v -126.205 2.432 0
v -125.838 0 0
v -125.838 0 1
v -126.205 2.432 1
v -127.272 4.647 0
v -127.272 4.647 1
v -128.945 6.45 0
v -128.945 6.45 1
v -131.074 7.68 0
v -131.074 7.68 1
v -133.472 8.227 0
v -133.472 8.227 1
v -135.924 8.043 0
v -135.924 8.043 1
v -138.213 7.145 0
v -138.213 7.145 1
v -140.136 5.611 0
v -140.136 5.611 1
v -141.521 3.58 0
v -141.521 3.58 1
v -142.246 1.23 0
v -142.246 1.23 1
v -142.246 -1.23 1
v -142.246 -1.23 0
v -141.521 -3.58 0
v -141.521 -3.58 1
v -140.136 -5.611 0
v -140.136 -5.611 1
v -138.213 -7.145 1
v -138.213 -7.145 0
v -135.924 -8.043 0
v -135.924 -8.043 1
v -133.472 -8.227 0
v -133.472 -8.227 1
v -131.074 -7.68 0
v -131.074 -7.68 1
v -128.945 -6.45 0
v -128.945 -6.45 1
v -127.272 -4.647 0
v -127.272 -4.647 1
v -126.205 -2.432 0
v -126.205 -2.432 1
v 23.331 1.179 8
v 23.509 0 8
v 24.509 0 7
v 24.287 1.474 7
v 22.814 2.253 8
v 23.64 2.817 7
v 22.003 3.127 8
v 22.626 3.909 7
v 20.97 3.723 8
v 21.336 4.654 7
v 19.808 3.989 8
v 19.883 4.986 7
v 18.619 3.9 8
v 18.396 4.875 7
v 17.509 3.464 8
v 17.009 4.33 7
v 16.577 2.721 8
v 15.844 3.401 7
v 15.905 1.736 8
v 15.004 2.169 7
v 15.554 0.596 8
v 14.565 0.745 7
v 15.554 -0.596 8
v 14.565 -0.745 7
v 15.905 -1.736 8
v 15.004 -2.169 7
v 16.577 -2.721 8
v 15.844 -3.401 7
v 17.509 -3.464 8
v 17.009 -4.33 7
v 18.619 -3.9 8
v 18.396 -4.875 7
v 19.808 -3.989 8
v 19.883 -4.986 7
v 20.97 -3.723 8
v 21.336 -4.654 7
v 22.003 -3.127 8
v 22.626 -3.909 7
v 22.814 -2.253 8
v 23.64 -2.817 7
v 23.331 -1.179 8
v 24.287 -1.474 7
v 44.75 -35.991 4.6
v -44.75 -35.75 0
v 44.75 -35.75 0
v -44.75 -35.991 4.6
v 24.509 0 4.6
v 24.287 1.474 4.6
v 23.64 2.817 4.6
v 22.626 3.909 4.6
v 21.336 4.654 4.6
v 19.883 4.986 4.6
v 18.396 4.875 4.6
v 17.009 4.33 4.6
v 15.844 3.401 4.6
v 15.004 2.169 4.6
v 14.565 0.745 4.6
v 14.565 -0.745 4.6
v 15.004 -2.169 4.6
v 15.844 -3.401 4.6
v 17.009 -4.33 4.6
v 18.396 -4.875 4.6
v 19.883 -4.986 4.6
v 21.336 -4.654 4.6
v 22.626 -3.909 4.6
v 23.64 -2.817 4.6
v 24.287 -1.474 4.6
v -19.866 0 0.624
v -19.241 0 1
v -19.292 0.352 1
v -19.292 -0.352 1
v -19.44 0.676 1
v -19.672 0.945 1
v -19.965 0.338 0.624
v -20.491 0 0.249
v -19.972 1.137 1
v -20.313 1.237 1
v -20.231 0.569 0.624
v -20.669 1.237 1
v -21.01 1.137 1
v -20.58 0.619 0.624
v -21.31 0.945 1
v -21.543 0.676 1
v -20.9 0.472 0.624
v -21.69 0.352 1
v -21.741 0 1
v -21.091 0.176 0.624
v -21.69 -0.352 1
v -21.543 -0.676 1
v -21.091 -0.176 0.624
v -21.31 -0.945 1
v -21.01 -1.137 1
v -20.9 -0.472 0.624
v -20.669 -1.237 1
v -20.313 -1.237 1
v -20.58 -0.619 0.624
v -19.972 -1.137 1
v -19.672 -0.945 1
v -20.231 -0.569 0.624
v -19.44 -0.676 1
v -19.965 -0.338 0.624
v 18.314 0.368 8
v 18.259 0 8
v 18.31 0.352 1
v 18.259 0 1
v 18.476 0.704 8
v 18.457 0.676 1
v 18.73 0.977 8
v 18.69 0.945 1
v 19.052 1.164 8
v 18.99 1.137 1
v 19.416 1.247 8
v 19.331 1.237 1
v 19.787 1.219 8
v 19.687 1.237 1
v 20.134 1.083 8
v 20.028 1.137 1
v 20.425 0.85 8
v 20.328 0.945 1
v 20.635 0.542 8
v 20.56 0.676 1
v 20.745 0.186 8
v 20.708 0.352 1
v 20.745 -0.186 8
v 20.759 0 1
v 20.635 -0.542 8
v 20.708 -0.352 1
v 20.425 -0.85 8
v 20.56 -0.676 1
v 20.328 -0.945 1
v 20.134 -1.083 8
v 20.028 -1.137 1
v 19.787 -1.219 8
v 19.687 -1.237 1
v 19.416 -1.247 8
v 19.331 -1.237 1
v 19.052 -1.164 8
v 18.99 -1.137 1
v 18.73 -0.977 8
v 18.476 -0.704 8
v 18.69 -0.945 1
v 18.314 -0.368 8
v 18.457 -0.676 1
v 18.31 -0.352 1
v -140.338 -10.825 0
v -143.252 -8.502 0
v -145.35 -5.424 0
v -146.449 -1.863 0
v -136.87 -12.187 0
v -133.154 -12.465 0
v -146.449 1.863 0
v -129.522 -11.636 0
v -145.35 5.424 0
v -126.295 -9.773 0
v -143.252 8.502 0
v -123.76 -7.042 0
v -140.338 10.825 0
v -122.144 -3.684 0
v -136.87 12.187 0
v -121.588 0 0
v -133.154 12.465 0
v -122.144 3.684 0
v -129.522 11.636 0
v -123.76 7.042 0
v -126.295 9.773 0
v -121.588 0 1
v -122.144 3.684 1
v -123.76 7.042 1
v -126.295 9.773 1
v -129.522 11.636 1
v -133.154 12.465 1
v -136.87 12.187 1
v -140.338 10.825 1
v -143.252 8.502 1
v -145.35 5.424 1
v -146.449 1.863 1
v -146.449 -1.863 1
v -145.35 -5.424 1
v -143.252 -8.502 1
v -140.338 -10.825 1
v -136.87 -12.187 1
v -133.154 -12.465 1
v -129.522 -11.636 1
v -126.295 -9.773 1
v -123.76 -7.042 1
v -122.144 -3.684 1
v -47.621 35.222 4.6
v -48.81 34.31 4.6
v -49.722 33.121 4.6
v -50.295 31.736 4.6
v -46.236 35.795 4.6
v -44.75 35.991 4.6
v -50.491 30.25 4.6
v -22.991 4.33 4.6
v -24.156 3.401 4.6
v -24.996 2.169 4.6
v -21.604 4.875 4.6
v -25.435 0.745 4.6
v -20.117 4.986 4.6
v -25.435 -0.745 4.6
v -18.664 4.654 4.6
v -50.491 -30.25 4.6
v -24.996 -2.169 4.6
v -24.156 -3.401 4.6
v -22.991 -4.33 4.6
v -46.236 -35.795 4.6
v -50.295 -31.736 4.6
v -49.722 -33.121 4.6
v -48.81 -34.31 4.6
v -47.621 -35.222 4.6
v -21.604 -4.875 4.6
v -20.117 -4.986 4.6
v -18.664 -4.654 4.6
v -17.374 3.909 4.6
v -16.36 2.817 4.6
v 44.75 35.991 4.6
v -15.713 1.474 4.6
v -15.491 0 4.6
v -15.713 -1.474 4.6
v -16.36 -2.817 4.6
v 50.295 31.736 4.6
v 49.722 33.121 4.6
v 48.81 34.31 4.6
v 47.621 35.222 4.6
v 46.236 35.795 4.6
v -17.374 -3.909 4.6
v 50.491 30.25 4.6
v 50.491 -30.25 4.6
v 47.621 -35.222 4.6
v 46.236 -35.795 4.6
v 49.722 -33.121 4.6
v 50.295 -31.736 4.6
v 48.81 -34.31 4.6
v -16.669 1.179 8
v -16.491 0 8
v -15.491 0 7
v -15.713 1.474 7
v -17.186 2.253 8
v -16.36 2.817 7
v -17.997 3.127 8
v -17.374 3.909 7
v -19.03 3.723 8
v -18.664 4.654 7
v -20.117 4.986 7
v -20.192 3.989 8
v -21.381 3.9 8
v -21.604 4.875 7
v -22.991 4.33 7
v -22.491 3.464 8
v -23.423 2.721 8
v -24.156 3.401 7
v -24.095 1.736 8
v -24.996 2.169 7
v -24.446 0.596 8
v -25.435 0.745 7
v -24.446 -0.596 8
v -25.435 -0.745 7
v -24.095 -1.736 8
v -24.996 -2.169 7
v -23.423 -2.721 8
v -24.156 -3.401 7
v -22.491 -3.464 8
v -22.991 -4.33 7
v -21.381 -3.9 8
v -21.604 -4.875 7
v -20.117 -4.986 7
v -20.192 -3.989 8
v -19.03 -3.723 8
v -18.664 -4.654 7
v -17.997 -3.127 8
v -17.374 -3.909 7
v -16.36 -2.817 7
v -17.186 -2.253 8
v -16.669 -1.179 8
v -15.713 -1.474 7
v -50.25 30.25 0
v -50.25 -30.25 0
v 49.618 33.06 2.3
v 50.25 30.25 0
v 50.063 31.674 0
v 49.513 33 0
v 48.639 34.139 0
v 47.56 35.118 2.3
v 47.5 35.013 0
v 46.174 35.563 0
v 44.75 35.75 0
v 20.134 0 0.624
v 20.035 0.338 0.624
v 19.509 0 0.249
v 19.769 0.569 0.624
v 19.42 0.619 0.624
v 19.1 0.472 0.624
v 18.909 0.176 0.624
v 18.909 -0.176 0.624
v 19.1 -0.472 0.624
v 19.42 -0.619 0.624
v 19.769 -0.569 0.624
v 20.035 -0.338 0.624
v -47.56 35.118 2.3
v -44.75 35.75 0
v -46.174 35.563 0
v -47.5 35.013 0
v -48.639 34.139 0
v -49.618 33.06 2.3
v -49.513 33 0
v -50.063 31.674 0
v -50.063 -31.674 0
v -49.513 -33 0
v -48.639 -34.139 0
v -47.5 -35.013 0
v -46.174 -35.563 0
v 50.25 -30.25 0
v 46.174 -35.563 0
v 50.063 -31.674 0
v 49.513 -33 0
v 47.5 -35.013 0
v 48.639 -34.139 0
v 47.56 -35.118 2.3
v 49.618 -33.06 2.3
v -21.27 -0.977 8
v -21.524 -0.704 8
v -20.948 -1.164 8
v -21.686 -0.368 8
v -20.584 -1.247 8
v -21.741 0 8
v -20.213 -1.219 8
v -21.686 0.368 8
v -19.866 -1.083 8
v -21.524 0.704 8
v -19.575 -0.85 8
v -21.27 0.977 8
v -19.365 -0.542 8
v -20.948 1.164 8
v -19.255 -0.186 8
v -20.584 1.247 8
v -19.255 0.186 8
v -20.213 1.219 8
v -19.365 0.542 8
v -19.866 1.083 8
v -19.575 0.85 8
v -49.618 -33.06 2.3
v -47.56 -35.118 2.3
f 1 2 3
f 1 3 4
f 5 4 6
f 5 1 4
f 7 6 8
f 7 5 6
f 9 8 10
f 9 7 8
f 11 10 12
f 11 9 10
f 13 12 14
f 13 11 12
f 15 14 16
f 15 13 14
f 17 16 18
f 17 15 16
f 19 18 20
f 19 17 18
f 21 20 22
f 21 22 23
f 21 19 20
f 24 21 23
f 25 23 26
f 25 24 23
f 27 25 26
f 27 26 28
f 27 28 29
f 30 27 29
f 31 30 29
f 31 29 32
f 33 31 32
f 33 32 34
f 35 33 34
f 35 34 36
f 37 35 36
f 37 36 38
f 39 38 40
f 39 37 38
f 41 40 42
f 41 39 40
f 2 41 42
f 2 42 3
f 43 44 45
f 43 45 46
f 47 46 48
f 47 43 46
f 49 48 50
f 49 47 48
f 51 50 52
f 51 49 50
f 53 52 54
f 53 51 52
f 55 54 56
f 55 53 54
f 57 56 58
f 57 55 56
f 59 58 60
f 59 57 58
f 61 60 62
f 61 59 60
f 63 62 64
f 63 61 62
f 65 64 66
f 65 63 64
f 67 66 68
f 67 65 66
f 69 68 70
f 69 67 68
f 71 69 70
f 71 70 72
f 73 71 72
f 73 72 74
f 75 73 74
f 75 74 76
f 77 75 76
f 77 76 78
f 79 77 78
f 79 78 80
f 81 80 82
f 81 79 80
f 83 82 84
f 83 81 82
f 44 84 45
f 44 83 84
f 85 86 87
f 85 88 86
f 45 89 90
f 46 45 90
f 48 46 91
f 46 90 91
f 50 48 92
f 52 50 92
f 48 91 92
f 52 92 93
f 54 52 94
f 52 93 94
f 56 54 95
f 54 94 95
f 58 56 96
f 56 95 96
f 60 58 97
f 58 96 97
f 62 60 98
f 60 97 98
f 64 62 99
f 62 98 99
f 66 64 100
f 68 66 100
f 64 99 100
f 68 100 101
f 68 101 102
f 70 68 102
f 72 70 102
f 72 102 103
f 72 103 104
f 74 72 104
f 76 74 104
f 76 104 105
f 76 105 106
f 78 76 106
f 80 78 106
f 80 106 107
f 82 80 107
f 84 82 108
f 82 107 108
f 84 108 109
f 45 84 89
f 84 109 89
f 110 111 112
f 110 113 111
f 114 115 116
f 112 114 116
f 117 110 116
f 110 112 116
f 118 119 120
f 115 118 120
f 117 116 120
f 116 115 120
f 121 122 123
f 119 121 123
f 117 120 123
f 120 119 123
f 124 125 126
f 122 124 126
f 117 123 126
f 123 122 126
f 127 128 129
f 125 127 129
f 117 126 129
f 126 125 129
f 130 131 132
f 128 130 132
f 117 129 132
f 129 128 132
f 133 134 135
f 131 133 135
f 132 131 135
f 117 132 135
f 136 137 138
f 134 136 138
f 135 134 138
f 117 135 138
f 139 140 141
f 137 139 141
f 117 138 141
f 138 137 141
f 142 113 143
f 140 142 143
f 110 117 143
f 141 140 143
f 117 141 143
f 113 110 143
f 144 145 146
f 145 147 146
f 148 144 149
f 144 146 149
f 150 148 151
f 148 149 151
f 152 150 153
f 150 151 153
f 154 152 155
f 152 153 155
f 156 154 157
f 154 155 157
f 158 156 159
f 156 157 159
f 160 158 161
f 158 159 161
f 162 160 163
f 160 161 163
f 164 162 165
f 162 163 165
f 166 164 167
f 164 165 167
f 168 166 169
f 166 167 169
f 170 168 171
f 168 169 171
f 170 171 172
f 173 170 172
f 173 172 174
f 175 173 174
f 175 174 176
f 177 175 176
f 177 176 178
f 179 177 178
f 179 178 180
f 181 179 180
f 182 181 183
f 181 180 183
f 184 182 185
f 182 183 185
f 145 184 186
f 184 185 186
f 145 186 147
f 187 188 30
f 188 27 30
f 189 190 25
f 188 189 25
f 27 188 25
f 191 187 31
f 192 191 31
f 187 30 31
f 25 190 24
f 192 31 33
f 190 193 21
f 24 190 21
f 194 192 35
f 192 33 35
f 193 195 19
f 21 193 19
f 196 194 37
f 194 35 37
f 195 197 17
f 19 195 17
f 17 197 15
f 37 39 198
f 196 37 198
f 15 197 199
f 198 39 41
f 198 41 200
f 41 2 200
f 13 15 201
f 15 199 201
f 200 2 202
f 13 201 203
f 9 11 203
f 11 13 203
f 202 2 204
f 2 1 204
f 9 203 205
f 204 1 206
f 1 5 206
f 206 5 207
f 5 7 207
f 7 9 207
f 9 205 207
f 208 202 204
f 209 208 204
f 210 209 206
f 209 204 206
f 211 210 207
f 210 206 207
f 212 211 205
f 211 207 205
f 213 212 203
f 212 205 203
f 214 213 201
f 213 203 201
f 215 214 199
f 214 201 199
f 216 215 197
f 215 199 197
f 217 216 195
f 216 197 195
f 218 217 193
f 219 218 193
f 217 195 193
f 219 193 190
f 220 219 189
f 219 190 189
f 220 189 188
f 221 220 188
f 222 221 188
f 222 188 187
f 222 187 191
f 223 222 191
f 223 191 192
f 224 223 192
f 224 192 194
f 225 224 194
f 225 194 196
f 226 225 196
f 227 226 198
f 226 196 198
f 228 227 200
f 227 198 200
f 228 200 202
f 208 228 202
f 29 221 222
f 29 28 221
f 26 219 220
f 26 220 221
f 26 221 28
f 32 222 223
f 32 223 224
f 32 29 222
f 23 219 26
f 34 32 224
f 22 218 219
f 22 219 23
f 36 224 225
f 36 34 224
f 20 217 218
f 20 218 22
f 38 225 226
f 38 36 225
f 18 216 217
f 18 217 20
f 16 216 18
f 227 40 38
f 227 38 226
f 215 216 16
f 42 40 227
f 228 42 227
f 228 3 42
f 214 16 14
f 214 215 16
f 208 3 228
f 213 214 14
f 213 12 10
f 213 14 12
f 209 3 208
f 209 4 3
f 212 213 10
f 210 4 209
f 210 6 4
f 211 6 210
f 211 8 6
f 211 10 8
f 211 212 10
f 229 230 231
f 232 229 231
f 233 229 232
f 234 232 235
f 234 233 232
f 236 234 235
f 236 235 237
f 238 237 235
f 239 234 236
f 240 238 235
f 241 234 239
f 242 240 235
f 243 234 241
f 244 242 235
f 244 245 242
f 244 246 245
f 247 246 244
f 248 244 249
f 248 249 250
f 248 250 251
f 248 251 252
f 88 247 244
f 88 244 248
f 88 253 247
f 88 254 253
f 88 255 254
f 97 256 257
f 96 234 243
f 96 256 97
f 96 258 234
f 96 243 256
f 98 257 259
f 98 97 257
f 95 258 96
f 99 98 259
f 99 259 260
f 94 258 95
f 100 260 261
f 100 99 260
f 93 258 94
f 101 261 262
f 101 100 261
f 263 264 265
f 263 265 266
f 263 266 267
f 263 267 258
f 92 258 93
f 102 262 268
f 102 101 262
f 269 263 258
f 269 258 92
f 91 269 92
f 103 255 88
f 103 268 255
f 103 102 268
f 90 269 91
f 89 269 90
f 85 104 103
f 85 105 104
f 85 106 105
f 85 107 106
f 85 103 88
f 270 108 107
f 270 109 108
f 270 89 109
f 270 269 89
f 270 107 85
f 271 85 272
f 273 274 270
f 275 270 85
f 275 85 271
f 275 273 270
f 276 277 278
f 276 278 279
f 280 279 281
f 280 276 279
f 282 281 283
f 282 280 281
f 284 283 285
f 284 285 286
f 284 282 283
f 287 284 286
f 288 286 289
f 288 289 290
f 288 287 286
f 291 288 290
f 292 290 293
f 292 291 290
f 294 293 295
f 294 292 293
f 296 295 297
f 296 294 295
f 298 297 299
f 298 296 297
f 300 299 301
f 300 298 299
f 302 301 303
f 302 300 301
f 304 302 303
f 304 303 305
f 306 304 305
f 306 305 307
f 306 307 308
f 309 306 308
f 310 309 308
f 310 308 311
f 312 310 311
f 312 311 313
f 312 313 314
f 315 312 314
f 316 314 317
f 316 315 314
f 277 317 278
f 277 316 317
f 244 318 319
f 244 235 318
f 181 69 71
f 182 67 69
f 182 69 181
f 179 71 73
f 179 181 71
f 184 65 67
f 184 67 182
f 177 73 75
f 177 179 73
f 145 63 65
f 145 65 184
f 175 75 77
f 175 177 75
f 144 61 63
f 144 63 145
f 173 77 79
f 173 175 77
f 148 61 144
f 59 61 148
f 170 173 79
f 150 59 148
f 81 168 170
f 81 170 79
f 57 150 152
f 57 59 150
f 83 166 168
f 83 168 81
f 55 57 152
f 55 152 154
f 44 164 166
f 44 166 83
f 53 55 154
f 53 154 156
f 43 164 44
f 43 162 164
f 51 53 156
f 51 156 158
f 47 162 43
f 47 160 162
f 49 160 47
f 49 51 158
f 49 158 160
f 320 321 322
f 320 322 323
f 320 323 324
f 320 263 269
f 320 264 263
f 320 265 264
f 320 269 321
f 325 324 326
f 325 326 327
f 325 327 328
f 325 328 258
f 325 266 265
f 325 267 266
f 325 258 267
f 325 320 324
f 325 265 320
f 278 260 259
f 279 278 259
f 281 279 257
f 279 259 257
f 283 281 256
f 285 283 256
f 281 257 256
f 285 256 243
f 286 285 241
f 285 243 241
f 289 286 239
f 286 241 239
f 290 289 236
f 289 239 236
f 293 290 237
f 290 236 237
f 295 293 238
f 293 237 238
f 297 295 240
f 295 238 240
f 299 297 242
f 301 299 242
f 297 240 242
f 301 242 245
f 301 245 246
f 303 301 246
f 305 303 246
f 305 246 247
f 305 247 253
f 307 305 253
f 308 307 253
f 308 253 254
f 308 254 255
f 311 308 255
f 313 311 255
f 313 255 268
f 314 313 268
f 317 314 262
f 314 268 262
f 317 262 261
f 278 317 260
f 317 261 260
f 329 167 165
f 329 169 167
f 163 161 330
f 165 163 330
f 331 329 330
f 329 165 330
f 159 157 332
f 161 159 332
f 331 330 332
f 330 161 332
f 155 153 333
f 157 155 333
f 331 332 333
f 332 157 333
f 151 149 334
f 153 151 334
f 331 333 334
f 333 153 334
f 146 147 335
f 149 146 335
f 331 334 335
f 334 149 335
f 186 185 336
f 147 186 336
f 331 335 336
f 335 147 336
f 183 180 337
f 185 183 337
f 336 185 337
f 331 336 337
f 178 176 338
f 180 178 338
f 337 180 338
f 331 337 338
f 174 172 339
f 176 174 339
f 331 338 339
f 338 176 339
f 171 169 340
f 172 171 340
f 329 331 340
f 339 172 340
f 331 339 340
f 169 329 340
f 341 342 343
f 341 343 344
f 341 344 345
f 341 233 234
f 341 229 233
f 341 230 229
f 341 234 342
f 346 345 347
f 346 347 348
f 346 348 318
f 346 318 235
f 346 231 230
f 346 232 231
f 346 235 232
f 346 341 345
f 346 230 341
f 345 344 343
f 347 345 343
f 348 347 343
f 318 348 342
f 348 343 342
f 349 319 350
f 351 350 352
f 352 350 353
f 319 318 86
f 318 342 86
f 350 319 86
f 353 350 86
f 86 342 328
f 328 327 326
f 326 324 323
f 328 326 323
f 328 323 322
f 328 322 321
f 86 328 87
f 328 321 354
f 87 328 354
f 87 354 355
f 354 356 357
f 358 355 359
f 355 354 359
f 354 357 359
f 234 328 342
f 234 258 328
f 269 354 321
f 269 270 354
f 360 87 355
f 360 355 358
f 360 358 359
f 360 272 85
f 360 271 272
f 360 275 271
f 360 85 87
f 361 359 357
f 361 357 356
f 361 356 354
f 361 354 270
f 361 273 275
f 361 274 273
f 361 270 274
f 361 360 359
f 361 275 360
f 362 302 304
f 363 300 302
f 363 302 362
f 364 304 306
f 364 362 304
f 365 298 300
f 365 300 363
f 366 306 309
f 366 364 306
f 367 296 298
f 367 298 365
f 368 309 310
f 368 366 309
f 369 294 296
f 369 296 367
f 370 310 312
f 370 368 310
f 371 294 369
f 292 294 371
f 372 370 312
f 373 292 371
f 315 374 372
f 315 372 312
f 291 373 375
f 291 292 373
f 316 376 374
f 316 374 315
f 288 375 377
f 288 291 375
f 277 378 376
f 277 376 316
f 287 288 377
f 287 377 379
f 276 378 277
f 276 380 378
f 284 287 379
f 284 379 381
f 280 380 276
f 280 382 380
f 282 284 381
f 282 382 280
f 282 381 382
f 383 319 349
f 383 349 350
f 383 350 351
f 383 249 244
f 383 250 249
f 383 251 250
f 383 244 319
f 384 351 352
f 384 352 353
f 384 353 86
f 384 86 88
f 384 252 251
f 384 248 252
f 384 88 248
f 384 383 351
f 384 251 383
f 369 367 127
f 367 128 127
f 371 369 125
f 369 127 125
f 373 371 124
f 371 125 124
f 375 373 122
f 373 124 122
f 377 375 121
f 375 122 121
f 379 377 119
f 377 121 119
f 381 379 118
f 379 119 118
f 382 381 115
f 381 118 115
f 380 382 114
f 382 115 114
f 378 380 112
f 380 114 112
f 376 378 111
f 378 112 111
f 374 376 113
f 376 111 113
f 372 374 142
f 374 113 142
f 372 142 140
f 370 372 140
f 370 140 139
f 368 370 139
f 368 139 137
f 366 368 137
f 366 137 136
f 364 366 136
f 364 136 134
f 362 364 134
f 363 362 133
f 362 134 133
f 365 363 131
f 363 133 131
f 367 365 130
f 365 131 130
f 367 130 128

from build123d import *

# Parameters (mm, degrees)
F1_DEPTH = 4.6
F1_TAPER = -3
F2_R     = 5
F3_DEPTH = 3.4
F4_SIZE  = 1
F6_D     = 2.5
F6_DEPTH = 7
F6_TIP   = 0.7510757738
F7_R     = 12.5
F7_R_2   = 8.25
F8_DEPTH = 1


with BuildPart() as f1:
    # F0 (on Top) → F1 (new body)
    with BuildSketch(Plane.XY):
        with BuildLine():
            Line((-44.75, -35.75), (44.75, -35.75))
            ThreePointArc((44.75, -35.75), (48.6390872965, -34.1390872965), (50.25, -30.25))
            Line((50.25, -30.25), (50.25, 30.25))
            ThreePointArc((50.25, 30.25), (48.6390872965, 34.1390872965), (44.75, 35.75))
            Line((44.75, 35.75), (-44.75, 35.75))
            ThreePointArc((-44.75, 35.75), (-48.6390872965, 34.1390872965), (-50.25, 30.25))
            Line((-50.25, 30.25), (-50.25, -30.25))
            ThreePointArc((-50.25, -30.25), (-48.6390872965, -34.1390872965), (-44.75, -35.75))
        make_face()
    extrude(amount=F1_DEPTH, taper=F1_TAPER)

    # F2 (on face) → F3 (join)
    with BuildSketch(Plane.XY.offset(4.6)):
        with Locations((19.5089242153, 0)):
            Circle(F2_R)
        with Locations((-20.4910757847, 0)):
            Circle(F2_R)
    extrude(amount=F3_DEPTH)

    # F4
    f4_edges = [f1.edges().sort_by_distance(p)[0] for p in [
        (-25.491076, 0, 8),
        (14.508924, 0, 8),
    ]]
    chamfer(f4_edges, length=F4_SIZE)

    # F6
    with Locations(Plane.XY.offset(8)):
        with Locations((-20.4910757847, 0), (19.5089242153, 0)):
            Hole(F6_D / 2, depth=F6_DEPTH)
            with Locations((0, 0, -(F6_DEPTH + F6_TIP / 2))):  # 118° drill point
                Cone(0, F6_D / 2, F6_TIP, mode=Mode.SUBTRACT)


with BuildPart() as f8:
    # F7 (on Top) → F8 (new body)
    with BuildSketch(Plane.XY):
        with Locations((-134.0883696164, 0)):
            Circle(F7_R)
        with Locations((-134.0883696164, 0)):
            Circle(F7_R_2, mode=Mode.SUBTRACT)
    extrude(amount=F8_DEPTH)


solid = Compound([f1.part, f8.part])
